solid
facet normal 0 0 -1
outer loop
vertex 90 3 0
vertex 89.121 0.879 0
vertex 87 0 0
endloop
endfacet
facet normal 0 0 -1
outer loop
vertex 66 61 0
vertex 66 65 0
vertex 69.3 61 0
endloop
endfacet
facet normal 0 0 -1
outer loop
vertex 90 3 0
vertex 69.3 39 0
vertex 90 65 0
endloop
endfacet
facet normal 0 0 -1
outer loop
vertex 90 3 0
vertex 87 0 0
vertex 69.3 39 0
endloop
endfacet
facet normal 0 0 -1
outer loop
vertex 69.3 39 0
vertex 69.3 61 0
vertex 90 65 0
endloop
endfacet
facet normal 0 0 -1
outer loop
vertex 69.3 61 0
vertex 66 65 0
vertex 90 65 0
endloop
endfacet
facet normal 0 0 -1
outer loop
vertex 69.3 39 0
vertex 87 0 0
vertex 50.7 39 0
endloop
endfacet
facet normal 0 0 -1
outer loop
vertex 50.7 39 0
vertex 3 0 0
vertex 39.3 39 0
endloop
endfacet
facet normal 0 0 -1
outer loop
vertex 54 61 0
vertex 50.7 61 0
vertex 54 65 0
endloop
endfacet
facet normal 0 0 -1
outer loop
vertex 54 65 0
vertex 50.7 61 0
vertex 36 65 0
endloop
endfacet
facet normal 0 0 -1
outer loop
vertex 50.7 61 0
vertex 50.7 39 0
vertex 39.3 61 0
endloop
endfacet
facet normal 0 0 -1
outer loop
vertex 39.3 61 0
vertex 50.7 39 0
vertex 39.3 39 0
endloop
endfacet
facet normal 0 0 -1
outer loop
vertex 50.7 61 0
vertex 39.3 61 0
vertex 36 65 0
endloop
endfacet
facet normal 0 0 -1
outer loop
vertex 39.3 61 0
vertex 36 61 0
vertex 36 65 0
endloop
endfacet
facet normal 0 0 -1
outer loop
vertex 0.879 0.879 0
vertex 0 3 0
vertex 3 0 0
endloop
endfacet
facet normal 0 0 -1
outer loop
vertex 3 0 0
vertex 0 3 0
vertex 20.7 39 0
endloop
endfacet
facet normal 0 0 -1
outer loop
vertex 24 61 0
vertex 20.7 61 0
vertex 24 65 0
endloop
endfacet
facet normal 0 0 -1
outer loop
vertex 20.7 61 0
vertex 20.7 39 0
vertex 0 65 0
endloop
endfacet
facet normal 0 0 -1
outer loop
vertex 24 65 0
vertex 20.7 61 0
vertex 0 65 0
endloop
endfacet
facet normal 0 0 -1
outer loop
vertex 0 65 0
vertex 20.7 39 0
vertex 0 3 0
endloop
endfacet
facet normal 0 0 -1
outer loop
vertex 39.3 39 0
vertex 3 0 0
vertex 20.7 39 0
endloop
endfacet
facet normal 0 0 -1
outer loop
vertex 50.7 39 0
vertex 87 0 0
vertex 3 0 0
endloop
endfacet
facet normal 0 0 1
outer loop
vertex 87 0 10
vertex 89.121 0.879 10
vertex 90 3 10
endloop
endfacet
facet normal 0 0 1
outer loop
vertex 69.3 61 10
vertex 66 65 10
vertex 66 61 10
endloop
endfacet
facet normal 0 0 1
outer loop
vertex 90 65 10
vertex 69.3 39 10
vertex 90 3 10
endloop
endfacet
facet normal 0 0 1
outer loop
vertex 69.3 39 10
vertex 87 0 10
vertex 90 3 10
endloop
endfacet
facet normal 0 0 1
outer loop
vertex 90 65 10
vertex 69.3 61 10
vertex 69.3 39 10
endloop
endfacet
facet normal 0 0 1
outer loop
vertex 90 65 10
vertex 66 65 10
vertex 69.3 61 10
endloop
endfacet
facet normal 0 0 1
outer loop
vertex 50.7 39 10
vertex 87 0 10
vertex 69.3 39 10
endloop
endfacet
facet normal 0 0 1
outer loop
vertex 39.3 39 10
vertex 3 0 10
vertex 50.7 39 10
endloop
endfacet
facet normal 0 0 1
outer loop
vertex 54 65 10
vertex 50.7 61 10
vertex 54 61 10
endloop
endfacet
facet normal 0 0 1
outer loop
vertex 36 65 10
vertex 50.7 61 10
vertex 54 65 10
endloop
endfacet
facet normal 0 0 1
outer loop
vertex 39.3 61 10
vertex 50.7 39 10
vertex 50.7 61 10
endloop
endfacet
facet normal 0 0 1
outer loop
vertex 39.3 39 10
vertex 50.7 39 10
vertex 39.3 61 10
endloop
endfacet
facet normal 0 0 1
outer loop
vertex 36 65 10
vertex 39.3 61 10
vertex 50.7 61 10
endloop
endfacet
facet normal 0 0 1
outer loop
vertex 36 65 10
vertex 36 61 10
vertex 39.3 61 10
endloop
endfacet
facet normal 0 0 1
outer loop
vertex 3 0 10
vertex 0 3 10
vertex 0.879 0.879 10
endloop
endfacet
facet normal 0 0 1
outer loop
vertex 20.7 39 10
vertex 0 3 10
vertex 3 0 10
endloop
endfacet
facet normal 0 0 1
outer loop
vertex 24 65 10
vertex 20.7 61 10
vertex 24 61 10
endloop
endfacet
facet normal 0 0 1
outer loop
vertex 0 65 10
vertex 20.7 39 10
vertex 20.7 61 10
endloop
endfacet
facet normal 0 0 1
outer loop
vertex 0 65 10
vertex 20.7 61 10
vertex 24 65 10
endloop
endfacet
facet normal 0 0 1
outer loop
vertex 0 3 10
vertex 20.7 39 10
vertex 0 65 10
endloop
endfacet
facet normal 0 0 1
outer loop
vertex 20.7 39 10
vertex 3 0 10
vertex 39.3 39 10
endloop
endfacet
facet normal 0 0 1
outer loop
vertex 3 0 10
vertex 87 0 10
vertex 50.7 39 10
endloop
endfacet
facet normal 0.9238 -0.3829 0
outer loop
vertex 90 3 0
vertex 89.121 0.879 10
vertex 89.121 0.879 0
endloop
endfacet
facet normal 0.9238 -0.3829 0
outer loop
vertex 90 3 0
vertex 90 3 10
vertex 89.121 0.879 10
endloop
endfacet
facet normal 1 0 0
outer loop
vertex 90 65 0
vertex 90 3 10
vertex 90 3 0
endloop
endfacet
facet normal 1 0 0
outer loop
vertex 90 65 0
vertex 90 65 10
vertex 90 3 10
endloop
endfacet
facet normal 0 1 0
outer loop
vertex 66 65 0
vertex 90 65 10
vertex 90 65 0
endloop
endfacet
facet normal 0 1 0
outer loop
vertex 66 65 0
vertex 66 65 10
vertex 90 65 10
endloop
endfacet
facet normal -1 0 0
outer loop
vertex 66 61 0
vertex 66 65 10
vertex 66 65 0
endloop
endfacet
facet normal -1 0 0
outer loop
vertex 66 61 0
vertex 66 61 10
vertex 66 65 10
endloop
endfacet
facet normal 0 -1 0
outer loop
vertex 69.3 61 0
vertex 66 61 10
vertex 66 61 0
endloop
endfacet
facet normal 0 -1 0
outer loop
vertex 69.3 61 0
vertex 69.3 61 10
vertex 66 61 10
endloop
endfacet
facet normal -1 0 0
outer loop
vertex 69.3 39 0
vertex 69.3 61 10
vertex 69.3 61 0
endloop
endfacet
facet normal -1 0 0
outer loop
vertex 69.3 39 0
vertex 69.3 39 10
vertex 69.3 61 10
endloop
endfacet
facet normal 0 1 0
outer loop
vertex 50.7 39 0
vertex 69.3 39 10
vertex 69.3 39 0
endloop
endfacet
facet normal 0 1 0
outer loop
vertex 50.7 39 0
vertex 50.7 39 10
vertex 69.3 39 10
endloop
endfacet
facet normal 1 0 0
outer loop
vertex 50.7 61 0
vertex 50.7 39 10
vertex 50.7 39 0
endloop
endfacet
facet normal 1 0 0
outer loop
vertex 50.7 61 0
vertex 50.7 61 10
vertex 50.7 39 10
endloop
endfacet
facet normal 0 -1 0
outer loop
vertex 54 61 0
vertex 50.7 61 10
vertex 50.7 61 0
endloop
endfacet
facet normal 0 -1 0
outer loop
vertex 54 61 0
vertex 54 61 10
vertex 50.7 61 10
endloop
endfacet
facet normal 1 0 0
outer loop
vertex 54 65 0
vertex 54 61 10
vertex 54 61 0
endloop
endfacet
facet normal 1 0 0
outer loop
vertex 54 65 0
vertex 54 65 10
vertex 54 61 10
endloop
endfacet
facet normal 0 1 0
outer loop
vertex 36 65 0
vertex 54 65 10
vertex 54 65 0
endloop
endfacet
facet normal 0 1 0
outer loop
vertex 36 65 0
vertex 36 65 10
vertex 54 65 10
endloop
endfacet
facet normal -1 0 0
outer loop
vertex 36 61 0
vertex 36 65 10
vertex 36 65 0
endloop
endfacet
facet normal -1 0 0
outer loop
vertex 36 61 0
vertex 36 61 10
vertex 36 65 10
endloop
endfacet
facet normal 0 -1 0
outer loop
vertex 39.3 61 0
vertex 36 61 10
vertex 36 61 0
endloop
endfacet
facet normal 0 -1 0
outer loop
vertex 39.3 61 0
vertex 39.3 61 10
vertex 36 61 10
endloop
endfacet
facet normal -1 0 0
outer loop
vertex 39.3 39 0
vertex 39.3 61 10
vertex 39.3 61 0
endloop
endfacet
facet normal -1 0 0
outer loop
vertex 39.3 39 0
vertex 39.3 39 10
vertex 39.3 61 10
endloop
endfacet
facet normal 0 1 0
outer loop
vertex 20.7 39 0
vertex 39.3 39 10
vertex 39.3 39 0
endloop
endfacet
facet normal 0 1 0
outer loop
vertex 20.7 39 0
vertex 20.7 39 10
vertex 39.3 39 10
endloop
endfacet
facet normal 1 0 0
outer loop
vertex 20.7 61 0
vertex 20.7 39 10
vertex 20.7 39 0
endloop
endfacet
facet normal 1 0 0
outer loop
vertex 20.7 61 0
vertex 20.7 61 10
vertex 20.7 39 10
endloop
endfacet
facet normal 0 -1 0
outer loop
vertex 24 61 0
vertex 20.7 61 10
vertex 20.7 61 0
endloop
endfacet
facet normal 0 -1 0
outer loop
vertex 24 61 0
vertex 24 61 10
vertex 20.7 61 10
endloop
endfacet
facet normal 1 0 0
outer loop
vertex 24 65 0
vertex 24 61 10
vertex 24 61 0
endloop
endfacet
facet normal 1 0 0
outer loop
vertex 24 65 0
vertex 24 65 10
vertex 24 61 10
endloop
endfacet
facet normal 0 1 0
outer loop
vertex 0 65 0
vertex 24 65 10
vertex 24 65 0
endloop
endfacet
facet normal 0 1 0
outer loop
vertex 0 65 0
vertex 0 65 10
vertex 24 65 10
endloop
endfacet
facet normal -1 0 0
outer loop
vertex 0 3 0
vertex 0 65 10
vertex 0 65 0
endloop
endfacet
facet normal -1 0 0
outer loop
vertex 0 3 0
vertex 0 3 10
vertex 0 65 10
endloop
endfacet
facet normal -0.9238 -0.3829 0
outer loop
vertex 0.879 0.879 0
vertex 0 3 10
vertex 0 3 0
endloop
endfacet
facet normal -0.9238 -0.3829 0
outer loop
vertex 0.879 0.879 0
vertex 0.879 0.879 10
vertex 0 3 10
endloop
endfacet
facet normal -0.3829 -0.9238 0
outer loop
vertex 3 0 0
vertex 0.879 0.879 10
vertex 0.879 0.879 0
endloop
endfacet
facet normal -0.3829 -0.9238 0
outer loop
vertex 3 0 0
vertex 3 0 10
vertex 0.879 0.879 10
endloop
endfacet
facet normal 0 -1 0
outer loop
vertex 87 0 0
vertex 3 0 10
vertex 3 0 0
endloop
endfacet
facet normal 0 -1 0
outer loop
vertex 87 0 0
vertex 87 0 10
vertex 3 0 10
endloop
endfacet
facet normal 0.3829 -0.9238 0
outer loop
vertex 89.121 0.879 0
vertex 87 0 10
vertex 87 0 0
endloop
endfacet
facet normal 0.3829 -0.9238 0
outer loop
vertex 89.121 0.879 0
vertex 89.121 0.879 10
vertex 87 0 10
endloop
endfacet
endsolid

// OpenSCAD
$fn = 32;

// ----------------------------------------------------------------------
// Window plate: 90 x 65 mm, 2 open windows
// ----------------------------------------------------------------------

// --- parameters (mm) ---
profile_height = 10;      // extrusion height
profile_points = 24;      // points of the closed outline

profile = [[0, 3], [0.879, 0.879], [3, 0], [87, 0], [89.121, 0.879], [90, 3], [90, 65], [66, 65], [66, 61], [69.3, 61], [69.3, 39], [50.7, 39], [50.7, 61], [54, 61], [54, 65], [36, 65], [36, 61], [39.3, 61], [39.3, 39], [20.7, 39], [20.7, 61], [24, 61], [24, 65], [0, 65]];  // single closed polygon, 24 points, counter clockwise

// --- the one profile operation ---
linear_extrude(height = profile_height) polygon(points = profile);
